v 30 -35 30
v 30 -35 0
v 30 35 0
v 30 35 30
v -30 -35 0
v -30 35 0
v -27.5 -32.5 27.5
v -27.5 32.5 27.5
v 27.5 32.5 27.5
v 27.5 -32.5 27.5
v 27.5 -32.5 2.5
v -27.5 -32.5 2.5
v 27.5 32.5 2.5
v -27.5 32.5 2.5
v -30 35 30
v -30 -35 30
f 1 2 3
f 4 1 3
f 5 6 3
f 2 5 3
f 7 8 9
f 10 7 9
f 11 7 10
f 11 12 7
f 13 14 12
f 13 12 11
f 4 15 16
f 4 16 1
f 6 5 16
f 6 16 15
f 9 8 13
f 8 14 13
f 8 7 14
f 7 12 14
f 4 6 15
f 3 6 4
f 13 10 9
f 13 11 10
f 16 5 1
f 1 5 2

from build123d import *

# Parameters (mm, degrees)
SKETCH1_W           = 60
SKETCH1_H           = 70
BOSS_EXTRUDE1_DEPTH = 30
SHELL1_T            = 2.5


with BuildPart() as part:
    # Sketch1 → Boss-Extrude1 (new body)
    with BuildSketch(Plane.XY):
        Rectangle(SKETCH1_W, SKETCH1_H)
    extrude(amount=BOSS_EXTRUDE1_DEPTH)

    # Shell1 (no face opened: a closed hollow body)
    add(offset(amount=-SHELL1_T, mode=Mode.PRIVATE), mode=Mode.SUBTRACT)


solid = part.part
